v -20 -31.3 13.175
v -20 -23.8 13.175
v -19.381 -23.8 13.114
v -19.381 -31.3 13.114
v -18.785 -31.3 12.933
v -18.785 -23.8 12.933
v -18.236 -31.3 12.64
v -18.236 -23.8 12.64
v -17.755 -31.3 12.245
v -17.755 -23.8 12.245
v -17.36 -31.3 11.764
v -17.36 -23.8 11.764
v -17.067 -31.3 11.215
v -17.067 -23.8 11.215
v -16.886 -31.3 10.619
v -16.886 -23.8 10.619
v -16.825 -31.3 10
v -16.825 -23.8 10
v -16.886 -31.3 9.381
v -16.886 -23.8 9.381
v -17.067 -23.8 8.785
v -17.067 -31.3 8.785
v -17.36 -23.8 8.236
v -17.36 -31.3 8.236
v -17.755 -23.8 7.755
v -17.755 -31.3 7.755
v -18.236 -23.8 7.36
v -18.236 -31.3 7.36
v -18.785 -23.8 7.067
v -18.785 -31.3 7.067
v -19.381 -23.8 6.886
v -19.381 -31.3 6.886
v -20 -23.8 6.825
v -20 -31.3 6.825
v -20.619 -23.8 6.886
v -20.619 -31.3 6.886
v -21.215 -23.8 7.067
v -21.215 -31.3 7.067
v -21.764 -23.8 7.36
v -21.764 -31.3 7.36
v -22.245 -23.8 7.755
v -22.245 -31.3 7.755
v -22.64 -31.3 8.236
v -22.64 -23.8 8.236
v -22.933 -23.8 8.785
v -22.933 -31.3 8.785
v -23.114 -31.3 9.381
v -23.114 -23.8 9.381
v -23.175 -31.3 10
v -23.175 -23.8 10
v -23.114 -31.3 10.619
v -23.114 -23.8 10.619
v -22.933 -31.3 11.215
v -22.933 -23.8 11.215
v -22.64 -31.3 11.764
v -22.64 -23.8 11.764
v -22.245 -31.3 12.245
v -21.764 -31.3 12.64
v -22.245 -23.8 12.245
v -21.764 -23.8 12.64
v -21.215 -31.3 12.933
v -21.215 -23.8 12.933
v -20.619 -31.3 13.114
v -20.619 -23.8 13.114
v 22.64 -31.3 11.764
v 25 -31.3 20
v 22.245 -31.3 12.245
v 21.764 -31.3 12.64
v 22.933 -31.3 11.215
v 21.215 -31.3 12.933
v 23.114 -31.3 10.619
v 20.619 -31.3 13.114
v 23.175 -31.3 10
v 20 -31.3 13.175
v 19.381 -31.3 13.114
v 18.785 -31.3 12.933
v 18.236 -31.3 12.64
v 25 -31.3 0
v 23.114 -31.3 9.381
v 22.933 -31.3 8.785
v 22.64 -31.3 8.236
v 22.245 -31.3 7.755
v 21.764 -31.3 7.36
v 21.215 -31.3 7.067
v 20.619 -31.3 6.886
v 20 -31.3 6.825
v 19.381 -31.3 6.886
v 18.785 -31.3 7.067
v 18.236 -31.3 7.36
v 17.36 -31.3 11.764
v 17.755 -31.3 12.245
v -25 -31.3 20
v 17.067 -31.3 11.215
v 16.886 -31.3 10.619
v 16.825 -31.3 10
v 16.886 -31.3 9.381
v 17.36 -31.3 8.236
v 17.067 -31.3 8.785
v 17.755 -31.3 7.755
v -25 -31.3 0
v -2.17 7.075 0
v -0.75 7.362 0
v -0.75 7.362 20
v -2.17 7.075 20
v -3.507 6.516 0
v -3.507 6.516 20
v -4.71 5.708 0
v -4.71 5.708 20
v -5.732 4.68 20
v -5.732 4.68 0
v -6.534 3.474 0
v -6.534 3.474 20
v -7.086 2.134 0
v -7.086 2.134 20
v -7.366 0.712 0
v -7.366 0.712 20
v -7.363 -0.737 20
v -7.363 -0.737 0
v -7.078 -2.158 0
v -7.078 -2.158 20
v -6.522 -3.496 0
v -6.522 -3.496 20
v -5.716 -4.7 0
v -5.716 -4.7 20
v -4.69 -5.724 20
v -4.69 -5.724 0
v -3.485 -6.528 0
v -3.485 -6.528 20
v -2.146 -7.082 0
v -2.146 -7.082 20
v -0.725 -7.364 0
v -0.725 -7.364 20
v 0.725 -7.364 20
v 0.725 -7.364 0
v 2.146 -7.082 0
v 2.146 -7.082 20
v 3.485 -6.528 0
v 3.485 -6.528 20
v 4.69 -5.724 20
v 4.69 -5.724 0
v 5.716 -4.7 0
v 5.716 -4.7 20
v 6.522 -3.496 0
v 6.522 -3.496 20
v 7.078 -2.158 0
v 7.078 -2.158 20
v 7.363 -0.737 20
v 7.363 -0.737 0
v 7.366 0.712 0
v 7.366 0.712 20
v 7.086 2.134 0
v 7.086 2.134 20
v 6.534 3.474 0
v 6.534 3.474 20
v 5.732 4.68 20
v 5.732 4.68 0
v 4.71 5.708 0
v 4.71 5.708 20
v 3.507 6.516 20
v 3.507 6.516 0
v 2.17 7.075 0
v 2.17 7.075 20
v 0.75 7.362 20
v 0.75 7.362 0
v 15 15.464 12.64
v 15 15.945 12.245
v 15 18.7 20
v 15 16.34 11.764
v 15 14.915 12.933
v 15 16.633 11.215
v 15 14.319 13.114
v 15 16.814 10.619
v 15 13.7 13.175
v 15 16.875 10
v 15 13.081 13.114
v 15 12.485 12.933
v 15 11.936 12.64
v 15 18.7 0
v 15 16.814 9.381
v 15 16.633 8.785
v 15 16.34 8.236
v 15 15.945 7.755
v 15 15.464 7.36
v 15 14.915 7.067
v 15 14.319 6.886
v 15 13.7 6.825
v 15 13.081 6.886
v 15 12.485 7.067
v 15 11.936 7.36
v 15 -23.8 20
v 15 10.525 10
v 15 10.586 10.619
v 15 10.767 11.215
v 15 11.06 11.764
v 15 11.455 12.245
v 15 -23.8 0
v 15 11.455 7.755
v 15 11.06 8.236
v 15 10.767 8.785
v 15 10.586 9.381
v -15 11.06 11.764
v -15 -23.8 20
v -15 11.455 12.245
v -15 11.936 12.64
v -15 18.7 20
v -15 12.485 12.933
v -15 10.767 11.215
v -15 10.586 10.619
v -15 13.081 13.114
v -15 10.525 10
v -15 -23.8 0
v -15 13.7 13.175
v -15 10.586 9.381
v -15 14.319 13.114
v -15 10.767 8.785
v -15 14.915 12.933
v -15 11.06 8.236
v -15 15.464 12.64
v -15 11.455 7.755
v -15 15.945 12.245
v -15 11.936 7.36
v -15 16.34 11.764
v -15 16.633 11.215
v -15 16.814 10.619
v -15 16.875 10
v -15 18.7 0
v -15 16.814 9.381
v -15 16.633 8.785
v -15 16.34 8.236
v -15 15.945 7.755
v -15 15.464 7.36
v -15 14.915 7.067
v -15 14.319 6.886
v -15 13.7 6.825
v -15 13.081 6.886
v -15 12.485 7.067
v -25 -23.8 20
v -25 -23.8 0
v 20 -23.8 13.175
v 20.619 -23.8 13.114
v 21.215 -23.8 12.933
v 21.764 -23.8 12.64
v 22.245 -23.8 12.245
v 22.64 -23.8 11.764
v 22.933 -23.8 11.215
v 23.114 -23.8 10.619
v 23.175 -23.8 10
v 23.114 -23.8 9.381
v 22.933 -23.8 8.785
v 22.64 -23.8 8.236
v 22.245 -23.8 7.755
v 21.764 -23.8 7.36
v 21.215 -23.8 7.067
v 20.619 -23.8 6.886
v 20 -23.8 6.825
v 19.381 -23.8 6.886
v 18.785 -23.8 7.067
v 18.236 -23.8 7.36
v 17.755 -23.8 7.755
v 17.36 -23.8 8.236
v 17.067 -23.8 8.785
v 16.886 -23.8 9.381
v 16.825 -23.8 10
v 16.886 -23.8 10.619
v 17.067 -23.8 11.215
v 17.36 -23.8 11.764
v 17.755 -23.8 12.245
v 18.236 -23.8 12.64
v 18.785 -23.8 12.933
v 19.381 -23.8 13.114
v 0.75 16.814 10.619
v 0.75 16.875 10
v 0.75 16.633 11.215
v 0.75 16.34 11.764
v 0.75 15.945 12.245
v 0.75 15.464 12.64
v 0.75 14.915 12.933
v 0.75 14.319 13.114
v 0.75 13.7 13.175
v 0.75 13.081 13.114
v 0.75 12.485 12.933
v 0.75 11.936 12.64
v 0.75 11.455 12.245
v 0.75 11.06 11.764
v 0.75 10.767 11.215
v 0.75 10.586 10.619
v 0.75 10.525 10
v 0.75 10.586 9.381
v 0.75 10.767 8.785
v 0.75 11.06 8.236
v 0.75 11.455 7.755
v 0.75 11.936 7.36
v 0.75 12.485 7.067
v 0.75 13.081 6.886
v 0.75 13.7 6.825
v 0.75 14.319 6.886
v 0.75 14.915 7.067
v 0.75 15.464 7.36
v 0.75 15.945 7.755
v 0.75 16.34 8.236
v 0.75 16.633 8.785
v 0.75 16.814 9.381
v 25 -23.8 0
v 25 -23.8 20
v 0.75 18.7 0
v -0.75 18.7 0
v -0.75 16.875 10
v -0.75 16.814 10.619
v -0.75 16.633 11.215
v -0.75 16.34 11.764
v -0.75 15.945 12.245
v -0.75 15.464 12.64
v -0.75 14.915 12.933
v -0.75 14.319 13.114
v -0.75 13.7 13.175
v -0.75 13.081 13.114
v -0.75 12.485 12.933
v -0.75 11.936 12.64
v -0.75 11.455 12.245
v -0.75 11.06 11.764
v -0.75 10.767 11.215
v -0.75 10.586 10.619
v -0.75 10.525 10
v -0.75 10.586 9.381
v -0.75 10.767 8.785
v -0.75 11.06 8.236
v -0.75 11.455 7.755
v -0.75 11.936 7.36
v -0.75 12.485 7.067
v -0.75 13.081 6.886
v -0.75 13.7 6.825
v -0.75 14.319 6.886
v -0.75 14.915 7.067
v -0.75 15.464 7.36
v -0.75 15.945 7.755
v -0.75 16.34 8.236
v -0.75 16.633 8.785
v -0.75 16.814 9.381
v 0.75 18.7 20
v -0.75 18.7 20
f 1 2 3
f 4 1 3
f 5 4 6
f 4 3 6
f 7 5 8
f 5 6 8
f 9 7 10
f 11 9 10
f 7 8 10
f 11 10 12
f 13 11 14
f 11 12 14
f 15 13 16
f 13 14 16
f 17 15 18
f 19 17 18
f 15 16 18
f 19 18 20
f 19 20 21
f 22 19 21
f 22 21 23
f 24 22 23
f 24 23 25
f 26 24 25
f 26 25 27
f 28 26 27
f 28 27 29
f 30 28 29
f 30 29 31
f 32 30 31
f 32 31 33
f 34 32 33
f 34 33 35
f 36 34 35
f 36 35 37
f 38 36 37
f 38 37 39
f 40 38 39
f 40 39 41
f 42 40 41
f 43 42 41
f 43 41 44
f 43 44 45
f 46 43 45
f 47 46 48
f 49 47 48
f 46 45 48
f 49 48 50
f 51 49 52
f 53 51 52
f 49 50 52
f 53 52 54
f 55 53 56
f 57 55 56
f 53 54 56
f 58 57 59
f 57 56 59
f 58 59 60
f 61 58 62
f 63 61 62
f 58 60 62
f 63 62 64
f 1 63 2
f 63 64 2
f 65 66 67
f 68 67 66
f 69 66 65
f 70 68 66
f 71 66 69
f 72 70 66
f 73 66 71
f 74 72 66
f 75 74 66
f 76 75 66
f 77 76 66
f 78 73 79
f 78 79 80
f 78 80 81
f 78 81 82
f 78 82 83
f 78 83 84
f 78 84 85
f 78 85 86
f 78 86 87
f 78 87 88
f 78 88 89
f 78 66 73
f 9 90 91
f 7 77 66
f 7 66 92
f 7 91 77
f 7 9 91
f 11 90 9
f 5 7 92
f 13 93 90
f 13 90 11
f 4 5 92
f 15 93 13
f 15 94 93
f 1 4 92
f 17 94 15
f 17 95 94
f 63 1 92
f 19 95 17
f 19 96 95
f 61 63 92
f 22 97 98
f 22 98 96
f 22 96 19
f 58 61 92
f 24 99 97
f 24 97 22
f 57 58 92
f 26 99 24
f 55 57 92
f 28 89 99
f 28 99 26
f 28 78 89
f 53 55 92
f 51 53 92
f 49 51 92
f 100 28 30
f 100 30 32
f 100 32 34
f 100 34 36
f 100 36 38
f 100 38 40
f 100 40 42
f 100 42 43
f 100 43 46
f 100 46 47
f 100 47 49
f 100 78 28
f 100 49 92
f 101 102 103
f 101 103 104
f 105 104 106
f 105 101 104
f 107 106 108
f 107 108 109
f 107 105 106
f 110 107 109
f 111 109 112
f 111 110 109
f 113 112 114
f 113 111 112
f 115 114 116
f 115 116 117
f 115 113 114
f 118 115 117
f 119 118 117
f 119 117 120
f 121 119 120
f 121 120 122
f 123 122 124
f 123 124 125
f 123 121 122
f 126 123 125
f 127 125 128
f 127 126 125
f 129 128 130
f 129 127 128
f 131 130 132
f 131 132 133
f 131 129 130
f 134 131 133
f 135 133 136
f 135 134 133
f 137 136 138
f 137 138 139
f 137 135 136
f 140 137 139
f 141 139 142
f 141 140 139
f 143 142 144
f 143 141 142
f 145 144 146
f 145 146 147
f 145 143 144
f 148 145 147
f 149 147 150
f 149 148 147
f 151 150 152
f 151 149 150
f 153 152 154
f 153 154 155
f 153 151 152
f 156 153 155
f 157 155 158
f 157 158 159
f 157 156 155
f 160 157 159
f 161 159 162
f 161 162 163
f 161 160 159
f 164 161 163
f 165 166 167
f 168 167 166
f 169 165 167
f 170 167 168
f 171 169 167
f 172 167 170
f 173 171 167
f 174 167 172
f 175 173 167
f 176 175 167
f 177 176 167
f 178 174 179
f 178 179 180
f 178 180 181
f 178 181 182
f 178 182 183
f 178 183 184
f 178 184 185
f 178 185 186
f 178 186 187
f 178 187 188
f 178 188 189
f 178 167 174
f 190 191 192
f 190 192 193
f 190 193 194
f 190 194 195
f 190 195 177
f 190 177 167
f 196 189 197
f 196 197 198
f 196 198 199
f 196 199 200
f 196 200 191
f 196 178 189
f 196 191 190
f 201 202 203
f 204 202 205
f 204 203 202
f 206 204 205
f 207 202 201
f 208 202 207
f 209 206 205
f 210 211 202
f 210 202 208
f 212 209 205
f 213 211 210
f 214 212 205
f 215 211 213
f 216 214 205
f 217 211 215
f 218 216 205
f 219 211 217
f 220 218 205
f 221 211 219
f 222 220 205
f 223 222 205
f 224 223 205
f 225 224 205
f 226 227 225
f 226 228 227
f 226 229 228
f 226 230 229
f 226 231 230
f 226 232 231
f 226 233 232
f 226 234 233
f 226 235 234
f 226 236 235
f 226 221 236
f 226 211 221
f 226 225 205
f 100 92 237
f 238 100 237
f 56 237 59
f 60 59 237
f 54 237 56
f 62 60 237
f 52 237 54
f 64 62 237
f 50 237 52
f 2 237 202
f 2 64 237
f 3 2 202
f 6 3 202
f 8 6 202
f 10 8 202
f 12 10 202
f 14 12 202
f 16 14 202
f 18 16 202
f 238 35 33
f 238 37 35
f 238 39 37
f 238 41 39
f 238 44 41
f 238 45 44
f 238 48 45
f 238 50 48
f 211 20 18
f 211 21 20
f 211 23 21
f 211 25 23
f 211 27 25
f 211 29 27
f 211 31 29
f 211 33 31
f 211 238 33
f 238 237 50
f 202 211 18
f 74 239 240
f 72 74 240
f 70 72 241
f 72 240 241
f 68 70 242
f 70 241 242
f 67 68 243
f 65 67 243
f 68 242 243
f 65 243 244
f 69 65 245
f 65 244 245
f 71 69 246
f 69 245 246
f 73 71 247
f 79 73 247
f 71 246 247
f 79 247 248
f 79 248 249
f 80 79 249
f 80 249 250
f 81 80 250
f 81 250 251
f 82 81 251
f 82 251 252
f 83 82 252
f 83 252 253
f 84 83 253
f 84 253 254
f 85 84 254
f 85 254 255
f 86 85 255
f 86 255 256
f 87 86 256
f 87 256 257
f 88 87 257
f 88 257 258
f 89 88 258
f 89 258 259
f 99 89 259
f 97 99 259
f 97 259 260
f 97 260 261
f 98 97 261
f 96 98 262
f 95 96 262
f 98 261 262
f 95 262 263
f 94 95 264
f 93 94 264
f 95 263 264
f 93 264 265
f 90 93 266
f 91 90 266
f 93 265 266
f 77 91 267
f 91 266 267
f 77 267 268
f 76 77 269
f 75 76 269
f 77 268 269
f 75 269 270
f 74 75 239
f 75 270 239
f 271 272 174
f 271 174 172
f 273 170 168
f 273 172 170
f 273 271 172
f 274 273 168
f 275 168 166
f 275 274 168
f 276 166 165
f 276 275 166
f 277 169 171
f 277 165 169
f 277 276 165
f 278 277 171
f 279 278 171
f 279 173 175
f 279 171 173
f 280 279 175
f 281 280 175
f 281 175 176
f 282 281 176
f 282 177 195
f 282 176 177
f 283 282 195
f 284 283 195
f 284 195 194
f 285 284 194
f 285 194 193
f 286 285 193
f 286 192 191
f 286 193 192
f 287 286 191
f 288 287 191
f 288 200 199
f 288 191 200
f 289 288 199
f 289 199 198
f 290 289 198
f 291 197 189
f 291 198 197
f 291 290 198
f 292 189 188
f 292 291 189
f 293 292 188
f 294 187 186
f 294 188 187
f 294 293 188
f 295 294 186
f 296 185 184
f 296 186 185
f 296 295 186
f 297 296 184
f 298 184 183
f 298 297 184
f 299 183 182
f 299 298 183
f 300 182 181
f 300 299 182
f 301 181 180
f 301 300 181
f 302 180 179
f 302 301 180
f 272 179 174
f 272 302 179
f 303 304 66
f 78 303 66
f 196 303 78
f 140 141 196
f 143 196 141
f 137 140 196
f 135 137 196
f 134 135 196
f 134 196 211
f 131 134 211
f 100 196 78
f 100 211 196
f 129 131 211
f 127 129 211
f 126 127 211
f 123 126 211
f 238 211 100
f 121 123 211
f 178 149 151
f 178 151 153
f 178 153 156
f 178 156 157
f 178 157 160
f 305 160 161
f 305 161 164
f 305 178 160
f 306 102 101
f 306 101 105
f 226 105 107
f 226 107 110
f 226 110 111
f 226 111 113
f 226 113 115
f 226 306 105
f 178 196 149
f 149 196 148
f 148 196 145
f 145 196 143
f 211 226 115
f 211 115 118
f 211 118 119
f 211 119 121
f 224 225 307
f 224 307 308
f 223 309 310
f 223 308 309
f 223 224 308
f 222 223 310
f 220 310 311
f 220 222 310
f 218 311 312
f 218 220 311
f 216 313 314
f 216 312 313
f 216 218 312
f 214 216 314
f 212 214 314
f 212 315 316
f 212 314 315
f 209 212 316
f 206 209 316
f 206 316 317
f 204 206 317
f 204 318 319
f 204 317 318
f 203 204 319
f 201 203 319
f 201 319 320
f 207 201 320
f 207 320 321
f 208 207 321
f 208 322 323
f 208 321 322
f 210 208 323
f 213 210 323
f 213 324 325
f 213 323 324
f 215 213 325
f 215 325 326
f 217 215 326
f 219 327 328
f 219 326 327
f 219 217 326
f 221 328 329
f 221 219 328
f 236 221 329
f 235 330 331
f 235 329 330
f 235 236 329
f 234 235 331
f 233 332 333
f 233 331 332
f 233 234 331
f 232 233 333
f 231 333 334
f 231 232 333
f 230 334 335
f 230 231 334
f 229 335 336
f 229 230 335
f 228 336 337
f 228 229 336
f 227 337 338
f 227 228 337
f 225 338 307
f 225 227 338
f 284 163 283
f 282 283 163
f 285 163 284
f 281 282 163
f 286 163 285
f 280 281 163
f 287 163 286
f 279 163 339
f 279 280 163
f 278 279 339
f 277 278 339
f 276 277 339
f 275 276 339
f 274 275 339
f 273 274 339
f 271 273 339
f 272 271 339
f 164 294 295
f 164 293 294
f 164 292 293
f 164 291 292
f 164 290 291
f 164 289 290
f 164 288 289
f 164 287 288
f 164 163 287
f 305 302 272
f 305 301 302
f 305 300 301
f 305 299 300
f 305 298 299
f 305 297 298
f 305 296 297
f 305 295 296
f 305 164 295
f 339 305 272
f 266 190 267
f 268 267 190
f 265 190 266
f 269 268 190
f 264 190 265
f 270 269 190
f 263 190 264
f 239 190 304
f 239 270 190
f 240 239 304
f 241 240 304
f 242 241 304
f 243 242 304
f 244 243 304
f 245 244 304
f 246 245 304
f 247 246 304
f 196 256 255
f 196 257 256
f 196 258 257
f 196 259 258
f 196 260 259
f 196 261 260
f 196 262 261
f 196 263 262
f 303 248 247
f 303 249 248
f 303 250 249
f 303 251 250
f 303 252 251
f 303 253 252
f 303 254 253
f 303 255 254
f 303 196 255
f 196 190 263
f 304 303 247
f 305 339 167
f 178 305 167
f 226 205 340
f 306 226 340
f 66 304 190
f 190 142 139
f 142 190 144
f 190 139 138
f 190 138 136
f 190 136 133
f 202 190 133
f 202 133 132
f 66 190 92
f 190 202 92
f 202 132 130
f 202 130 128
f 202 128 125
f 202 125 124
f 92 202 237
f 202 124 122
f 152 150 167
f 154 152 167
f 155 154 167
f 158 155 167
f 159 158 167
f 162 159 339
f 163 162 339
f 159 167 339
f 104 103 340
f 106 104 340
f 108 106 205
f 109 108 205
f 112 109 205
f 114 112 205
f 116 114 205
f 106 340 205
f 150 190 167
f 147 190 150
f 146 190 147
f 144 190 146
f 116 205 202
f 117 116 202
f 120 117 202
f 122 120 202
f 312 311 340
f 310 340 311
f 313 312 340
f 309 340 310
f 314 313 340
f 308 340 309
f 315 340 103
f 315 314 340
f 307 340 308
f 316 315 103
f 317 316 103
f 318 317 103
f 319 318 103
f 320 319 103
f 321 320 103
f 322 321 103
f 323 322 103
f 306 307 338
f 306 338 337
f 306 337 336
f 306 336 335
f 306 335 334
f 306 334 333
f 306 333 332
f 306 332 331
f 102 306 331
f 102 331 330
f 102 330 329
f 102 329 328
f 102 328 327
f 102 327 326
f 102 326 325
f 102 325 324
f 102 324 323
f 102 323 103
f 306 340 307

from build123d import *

# Parameters (mm, degrees)
SALIENTE_EXTRUIR1_DEPTH    = 20
CROQUIS2_R                 = 3.175
CORTAR_EXTRUIR1_DEPTH      = 54.209491634
CORTAR_EXTRUIR2_DEPTH      = 55.586536802
CORTAR_EXTRUIR2_DEPTH_BACK = 55.586536802
CROQUIS3_R                 = 3.175


with BuildPart() as part:
    # Croquis1 → Saliente-Extruir1 (new body)
    with BuildSketch(Plane.XY):
        with BuildLine():
            Line((-15, 18.7), (-0.75, 18.7))
            Line((-0.75, 18.7), (-0.75, 7.361895136))
            ThreePointArc((-0.75, 7.361895136), (0, -7.4), (0.75, 7.361895136))
            Line((0.75, 7.361895136), (0.75, 18.7))
            Line((0.75, 18.7), (15, 18.7))
            Line((15, 18.7), (15, -23.8))
            Line((15, -23.8), (25, -23.8))
            Line((25, -23.8), (25, -31.3))
            Line((25, -31.3), (-25, -31.3))
            Line((-25, -31.3), (-25, -23.8))
            Line((-25, -23.8), (-15, -23.8))
            Line((-15, -23.8), (-15, 18.7))
        make_face()
    extrude(amount=SALIENTE_EXTRUIR1_DEPTH)

    # Croquis2 → Cortar-Extruir1 (cut, through all)
    with BuildSketch(Plane(origin=(0, -23.8, 0), x_dir=(1, 0, 0), z_dir=(0, 1, 0))):
        with Locations(Location((-20, -10, 0), (0, 0, 270))):
            Circle(CROQUIS2_R)
        with Locations(Location((20, -10, 0), (0, 0, 270))):
            Circle(CROQUIS2_R)
    extrude(amount=-CORTAR_EXTRUIR1_DEPTH, mode=Mode.SUBTRACT)

    # Croquis3 → Cortar-Extruir2 (cut, two sides: drawn at the far end of the back side and taken through both)
    with BuildSketch(Plane(origin=(15, 0, 0), x_dir=(0, 0, -1), z_dir=(1, 0, 0)).offset(-CORTAR_EXTRUIR2_DEPTH_BACK)):
        with Locations(Location((-10, 13.7, 0), (0, 0, 90))):
            Circle(CROQUIS3_R)
    extrude(amount=CORTAR_EXTRUIR2_DEPTH + CORTAR_EXTRUIR2_DEPTH_BACK, mode=Mode.SUBTRACT)


solid = part.part
